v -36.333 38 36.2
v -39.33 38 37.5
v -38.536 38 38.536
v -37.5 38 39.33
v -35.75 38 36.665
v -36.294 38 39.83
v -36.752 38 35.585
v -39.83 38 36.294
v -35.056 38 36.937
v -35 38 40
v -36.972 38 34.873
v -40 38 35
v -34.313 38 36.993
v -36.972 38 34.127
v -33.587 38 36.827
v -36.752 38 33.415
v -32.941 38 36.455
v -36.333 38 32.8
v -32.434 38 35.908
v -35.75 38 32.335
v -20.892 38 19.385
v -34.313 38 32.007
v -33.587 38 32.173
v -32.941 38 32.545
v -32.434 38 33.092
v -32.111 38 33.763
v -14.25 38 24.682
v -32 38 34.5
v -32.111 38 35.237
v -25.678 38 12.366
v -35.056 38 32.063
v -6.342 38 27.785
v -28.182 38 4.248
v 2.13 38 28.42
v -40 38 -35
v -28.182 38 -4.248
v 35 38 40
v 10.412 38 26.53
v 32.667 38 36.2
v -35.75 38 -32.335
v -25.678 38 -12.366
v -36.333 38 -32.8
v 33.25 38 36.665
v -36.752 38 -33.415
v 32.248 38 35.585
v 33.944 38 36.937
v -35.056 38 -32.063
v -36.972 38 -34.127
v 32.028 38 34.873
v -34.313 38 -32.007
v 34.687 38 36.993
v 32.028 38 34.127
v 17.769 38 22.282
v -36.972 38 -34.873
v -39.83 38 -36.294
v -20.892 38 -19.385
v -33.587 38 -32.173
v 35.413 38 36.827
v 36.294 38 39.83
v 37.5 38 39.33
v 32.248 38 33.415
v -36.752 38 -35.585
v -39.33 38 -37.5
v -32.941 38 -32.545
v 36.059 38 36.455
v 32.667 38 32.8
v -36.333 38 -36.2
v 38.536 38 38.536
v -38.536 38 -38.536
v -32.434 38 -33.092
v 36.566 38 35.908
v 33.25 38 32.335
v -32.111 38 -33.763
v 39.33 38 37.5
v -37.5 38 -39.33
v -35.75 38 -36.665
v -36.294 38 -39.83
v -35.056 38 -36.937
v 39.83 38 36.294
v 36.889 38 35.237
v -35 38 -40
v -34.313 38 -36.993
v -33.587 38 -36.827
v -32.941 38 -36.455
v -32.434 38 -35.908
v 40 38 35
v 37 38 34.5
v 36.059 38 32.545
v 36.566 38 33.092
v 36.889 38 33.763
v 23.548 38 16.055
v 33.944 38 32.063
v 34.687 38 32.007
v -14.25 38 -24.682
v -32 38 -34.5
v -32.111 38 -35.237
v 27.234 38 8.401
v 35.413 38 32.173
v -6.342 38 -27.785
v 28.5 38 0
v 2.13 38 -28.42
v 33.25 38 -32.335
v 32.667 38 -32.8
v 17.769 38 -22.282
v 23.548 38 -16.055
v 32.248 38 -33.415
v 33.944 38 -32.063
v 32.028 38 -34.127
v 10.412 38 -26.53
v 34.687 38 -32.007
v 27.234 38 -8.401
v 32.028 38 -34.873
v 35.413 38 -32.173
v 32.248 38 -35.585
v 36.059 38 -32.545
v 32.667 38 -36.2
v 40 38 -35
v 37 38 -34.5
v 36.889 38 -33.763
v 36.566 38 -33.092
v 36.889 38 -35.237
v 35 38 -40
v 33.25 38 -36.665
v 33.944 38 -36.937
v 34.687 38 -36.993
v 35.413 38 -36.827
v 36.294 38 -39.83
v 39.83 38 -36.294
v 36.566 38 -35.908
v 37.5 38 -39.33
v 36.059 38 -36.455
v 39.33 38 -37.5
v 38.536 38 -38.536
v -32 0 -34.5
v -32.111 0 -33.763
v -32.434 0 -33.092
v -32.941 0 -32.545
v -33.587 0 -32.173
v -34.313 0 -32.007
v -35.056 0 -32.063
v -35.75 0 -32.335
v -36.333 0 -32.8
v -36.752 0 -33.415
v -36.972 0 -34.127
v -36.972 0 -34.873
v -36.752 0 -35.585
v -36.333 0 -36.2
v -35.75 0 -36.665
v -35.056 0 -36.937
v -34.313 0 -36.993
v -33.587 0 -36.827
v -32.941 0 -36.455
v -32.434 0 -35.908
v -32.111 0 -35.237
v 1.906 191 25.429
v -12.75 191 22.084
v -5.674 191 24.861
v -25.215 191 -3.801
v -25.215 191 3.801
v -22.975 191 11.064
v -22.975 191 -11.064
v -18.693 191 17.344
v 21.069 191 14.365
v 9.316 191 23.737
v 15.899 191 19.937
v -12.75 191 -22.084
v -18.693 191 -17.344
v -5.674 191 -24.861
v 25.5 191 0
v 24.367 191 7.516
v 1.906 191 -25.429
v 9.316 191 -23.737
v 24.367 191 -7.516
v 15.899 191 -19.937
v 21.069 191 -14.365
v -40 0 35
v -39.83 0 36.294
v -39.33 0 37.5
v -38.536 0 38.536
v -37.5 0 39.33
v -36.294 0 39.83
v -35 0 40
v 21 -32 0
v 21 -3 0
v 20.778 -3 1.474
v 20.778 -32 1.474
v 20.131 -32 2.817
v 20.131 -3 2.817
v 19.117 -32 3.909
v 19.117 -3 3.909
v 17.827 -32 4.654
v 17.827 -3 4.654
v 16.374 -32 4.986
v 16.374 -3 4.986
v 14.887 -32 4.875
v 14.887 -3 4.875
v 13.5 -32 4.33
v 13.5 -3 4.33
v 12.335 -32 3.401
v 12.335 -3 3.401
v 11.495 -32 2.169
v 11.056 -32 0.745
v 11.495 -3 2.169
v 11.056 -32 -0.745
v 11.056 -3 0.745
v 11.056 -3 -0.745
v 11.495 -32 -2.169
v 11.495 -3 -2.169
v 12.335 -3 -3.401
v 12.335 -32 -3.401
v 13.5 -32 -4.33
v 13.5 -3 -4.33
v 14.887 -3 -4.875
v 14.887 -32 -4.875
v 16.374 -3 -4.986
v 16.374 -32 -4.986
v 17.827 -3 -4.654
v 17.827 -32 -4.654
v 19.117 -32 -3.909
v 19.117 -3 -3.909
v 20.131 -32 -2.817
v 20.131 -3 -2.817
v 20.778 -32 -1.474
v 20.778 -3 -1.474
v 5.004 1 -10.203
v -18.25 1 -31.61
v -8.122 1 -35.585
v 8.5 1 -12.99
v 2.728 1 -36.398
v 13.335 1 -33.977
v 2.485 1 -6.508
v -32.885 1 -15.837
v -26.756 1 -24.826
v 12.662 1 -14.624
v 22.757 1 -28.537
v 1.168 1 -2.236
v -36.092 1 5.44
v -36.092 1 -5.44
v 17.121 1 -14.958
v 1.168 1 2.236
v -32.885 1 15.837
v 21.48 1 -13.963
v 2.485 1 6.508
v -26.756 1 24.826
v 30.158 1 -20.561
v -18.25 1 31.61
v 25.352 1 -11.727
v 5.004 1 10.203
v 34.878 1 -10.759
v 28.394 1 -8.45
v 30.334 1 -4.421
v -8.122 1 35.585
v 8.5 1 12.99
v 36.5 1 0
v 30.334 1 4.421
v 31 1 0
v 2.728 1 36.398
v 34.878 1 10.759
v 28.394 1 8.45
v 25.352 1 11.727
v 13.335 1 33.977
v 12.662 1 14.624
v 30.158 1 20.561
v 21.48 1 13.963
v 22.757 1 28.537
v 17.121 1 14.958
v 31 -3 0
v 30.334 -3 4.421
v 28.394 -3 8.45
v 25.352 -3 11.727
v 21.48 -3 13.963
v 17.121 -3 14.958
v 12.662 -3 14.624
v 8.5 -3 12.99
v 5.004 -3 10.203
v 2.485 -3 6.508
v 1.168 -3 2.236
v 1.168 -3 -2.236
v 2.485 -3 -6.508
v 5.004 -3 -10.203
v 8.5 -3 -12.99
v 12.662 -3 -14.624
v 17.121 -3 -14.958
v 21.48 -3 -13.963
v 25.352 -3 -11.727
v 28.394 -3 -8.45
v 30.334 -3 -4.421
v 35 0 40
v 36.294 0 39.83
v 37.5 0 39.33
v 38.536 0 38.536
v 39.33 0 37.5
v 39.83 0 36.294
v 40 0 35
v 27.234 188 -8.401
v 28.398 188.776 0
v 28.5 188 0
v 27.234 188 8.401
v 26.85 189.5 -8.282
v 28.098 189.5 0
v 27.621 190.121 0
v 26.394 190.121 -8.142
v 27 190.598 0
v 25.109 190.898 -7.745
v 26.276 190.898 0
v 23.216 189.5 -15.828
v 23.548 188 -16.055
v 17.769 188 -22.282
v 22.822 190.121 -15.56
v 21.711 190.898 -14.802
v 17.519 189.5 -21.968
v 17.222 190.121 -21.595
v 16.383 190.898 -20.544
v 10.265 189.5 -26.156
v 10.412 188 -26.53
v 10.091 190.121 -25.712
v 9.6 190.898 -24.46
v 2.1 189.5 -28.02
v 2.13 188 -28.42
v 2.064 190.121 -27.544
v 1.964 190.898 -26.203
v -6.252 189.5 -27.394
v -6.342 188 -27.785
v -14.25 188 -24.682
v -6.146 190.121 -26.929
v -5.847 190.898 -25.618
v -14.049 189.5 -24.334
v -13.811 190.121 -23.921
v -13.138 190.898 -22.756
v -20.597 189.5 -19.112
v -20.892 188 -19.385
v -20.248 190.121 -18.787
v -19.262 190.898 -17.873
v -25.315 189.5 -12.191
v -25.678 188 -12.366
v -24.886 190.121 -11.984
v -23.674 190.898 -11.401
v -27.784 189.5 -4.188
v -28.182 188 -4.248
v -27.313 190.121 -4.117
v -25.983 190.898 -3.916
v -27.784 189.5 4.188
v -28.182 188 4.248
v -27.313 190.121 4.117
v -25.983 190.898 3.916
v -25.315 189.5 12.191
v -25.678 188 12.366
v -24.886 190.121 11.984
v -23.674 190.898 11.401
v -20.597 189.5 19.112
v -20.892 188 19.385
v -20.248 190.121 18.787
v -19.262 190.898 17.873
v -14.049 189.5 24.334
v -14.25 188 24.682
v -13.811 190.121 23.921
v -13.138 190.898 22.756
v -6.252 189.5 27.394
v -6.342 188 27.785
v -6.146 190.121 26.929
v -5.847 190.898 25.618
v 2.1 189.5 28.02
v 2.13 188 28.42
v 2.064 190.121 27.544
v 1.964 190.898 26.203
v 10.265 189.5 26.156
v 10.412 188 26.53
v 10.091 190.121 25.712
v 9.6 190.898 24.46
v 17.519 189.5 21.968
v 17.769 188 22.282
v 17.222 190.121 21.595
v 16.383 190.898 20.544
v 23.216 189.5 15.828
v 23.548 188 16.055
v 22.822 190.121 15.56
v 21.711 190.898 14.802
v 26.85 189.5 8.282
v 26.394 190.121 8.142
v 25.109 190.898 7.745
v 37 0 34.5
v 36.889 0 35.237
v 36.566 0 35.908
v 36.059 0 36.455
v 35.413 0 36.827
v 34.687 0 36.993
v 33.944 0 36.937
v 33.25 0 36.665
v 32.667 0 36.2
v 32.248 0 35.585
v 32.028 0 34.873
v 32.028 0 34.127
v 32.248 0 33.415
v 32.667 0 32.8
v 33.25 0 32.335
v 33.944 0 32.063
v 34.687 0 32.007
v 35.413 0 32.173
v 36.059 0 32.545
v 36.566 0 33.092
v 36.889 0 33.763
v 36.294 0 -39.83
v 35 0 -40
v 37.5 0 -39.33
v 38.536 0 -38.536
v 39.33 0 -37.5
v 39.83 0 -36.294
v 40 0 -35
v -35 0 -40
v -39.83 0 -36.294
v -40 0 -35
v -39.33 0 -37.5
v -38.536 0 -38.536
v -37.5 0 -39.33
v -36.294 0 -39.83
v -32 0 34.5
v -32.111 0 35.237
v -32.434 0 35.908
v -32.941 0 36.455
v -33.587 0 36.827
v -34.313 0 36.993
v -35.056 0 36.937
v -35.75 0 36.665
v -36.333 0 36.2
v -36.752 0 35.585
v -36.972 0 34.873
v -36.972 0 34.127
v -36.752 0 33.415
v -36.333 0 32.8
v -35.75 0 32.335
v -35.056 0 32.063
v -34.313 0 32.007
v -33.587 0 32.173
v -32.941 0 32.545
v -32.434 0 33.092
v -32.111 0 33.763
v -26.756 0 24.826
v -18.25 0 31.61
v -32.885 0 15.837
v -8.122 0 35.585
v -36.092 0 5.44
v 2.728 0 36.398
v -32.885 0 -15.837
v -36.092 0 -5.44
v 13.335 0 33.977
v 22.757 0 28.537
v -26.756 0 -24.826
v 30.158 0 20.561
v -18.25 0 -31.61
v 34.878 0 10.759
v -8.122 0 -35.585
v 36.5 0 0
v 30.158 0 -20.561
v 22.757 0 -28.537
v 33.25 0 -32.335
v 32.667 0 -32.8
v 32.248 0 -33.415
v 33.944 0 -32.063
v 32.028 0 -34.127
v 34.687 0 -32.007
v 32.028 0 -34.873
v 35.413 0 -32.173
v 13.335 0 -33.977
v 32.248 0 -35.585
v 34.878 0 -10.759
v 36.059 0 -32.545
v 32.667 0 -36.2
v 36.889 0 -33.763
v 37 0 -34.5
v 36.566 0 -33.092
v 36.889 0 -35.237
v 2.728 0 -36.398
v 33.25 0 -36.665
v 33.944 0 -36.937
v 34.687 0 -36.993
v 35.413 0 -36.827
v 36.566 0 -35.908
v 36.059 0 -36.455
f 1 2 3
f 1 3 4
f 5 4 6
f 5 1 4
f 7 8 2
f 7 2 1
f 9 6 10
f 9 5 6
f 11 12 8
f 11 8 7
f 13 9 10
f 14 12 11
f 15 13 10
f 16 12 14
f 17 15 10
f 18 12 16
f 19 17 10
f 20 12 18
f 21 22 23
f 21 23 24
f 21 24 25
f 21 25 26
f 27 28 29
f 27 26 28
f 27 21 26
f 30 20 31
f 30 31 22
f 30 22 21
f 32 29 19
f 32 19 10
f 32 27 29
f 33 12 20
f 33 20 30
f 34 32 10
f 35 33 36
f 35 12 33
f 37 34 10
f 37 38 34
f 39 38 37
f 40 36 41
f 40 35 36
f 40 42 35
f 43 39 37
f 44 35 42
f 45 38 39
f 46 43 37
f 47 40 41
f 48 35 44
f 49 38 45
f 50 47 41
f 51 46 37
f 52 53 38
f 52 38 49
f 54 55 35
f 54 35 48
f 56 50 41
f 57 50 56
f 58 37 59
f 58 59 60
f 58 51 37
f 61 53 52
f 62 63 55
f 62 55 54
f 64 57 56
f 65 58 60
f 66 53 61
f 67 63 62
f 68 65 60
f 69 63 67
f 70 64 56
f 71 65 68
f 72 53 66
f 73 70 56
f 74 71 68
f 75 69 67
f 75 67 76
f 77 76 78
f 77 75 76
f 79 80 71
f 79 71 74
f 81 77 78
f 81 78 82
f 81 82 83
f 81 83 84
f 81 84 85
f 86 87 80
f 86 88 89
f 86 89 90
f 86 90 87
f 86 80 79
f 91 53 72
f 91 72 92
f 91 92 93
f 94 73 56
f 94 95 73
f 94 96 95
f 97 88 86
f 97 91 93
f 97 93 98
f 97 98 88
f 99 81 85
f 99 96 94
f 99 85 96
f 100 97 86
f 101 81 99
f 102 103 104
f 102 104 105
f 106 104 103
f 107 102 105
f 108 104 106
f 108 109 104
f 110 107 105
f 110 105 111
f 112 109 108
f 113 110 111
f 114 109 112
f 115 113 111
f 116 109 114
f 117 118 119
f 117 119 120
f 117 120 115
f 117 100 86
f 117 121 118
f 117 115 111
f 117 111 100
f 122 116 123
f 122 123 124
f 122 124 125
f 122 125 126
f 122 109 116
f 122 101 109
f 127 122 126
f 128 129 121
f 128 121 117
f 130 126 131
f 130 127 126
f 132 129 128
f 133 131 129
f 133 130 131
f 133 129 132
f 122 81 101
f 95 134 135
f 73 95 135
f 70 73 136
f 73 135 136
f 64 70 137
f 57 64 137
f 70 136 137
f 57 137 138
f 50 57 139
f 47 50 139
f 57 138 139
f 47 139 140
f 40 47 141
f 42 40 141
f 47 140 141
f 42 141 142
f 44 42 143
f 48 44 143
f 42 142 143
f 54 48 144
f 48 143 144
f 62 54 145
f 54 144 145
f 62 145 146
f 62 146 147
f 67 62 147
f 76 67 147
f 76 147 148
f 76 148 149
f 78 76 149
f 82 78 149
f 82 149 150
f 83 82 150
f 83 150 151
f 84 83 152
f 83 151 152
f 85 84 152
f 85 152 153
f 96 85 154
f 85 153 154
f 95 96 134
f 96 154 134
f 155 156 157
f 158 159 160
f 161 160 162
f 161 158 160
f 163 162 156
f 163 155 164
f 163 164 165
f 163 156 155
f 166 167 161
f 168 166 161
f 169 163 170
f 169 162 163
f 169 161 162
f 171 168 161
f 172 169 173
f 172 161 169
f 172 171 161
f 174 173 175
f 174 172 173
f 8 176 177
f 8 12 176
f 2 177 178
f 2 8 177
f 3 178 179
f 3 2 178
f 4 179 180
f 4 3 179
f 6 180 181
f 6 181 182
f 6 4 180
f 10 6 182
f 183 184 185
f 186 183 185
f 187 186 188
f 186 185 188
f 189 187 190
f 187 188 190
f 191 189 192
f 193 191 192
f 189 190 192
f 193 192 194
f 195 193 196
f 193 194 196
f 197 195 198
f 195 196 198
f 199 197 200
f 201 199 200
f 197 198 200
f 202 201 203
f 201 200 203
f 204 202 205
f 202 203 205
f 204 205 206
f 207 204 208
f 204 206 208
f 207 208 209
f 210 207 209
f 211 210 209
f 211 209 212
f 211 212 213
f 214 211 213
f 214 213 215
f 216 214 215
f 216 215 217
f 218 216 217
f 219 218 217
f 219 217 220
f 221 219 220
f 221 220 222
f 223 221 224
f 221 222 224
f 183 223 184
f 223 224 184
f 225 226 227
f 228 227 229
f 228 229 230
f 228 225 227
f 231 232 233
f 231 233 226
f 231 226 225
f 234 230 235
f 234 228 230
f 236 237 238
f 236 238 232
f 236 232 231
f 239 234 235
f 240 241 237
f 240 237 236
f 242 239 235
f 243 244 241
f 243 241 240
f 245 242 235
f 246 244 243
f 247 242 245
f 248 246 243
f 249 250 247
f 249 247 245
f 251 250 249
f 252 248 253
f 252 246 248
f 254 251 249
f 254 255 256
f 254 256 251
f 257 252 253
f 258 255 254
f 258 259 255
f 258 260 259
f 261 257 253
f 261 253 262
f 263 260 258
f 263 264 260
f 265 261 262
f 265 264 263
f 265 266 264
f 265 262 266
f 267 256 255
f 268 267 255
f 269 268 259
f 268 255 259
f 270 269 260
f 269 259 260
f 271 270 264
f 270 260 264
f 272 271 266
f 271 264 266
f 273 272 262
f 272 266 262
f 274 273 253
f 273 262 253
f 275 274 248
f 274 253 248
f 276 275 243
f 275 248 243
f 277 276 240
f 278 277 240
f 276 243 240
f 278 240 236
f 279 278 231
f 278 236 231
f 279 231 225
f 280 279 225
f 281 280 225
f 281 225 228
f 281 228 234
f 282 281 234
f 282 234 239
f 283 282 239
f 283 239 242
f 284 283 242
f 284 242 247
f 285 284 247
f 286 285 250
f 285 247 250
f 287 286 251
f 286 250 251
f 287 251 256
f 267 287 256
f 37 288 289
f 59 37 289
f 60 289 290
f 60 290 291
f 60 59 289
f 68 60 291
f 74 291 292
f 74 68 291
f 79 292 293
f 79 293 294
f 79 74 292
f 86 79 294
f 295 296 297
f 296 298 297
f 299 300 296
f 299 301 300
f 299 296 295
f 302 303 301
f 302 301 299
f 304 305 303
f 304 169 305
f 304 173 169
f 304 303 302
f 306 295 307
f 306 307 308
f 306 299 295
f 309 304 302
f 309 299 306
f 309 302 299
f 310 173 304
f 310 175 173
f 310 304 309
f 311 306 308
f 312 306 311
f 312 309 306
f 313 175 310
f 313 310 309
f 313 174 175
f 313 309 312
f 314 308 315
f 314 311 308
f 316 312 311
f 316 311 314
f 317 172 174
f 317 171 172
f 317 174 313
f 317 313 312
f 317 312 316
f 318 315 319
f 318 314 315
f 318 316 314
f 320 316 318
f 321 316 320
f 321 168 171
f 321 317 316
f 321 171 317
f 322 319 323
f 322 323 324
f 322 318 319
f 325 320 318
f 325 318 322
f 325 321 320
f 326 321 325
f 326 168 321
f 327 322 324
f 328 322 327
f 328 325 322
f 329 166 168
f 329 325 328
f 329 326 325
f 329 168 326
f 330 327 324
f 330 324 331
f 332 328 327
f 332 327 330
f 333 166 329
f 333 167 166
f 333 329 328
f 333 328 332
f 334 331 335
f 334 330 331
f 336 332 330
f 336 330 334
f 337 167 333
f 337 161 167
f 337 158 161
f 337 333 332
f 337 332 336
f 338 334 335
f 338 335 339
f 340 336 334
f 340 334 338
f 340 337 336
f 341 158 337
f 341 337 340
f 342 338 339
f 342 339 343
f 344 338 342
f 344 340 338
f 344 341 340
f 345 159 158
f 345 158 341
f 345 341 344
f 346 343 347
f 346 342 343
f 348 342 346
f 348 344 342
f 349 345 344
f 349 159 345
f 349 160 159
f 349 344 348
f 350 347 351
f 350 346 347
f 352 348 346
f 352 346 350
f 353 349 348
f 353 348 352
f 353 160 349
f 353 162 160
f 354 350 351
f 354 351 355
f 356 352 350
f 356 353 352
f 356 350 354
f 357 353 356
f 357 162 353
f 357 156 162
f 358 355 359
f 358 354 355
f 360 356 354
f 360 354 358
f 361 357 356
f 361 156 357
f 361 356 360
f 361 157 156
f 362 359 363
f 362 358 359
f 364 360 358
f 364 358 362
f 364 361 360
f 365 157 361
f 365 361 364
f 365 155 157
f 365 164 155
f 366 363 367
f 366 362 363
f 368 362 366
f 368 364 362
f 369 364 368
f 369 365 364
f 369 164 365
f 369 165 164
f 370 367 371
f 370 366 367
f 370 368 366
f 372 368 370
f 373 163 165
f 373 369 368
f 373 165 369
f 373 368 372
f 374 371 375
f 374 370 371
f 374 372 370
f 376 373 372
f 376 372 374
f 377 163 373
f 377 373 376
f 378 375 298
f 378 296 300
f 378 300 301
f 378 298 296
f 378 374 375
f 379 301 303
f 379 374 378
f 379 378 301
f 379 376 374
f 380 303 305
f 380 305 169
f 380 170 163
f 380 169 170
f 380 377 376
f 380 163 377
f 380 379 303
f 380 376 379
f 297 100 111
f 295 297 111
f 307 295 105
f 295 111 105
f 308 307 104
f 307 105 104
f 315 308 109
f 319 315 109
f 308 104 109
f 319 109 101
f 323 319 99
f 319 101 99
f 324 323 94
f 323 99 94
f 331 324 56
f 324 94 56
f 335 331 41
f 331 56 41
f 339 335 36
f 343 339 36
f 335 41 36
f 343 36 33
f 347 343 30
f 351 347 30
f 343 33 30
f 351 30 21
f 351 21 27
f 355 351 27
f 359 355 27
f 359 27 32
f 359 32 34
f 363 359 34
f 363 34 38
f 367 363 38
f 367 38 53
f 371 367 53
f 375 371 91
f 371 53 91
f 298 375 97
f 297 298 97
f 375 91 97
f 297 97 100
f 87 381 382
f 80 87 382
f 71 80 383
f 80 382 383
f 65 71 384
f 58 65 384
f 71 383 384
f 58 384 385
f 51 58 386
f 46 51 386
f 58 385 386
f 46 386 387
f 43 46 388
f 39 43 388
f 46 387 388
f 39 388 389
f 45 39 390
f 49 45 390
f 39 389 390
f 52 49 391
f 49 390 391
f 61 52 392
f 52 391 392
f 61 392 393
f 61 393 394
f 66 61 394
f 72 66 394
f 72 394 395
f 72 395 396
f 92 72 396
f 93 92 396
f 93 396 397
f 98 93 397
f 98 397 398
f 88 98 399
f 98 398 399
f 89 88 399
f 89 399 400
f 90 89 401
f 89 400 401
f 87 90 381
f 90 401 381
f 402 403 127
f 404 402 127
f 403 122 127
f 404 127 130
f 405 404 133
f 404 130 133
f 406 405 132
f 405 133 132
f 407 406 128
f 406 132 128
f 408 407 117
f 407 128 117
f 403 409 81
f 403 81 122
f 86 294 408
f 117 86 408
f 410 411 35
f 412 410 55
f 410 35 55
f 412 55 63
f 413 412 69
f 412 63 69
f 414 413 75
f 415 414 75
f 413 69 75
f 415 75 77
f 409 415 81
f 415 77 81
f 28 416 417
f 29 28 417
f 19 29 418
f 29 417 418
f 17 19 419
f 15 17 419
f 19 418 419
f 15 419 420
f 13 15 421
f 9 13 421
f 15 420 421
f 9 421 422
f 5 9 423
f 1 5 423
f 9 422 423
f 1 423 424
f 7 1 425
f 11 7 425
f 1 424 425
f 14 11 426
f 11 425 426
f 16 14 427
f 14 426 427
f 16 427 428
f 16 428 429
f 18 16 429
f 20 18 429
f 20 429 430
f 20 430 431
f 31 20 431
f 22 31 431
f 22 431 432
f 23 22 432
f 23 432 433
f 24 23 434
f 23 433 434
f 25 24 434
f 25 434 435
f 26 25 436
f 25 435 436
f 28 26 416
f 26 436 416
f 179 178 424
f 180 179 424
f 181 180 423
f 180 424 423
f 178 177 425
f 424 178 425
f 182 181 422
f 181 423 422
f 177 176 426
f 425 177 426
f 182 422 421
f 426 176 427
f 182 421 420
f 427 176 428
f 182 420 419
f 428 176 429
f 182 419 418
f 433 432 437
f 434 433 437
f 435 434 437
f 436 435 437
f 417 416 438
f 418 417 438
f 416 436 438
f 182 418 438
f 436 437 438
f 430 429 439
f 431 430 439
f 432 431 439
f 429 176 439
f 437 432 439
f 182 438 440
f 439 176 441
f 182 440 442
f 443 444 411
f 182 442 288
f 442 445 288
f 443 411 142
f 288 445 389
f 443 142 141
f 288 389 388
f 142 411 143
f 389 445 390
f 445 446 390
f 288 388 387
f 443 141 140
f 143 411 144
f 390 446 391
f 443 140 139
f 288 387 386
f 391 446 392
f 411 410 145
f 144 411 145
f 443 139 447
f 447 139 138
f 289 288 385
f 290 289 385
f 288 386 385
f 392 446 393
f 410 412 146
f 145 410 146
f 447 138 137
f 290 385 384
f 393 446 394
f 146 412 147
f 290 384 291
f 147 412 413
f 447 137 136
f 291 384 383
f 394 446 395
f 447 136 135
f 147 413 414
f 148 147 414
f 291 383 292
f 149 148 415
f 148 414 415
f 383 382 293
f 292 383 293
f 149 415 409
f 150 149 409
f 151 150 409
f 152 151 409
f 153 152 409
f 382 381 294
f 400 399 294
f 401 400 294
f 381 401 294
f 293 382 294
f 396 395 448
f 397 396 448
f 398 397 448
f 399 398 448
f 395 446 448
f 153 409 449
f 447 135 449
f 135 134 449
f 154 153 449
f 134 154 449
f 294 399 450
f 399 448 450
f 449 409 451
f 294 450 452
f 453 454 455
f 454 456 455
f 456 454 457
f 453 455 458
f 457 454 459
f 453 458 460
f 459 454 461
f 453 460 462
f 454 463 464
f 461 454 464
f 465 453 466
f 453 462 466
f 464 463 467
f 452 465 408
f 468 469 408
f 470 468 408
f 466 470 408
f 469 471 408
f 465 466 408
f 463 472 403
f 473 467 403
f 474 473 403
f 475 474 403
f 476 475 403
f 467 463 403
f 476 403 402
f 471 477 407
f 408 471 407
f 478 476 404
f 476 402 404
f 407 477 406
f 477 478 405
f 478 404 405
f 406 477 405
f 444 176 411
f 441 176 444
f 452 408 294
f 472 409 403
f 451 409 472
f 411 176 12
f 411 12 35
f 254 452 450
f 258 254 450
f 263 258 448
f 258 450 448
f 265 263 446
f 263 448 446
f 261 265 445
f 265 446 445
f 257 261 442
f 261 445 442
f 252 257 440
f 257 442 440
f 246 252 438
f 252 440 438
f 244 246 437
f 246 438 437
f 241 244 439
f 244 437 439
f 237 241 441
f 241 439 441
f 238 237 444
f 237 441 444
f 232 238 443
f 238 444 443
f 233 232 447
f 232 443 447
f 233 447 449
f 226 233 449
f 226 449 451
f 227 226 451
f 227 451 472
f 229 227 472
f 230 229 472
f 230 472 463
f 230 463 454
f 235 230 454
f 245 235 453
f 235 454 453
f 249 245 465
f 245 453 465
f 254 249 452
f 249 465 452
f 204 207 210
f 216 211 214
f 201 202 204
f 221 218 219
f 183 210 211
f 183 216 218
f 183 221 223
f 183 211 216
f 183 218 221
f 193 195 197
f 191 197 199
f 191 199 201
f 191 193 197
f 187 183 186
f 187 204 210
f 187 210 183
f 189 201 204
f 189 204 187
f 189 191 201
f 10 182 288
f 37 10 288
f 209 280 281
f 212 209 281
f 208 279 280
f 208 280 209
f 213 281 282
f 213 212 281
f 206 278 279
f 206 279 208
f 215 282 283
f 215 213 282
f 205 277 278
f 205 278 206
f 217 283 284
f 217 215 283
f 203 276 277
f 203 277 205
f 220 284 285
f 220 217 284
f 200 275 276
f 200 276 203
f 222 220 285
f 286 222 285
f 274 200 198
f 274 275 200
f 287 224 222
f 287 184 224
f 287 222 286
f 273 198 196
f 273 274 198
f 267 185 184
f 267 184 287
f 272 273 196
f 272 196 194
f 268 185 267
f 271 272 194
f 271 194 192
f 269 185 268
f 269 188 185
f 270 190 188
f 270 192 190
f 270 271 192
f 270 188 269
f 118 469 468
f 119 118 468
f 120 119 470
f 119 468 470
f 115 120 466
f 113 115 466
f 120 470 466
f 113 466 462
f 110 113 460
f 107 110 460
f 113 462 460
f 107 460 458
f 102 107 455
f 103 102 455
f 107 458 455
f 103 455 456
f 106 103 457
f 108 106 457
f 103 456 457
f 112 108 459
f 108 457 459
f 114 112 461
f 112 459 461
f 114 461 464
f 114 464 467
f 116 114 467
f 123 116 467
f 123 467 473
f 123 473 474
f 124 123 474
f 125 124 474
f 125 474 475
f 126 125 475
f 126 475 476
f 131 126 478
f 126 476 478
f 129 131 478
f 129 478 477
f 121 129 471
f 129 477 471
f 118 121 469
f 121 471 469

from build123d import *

# Parameters (mm, degrees)
SKETCH1_W           = 80
SKETCH1_H           = 80
BOSS_EXTRUDE1_DEPTH = 38
SKETCH2_R           = 28.5
BOSS_EXTRUDE2_DEPTH = 153
SKETCH3_R           = 36.5
CUT_EXTRUDE1_DEPTH  = 1
SKETCH4_R           = 15
BOSS_EXTRUDE3_DEPTH = 4
SKETCH5_R           = 5
BOSS_EXTRUDE4_DEPTH = 29
FILLET1_R           = 5
SKETCH6_R           = 2.5
CUT_EXTRUDE2_DEPTH  = 38
SKETCH7_R           = 2.5
CUT_EXTRUDE3_DEPTH  = 38
FILLET2_R           = 3


with BuildPart() as part:
    # Sketch1 → Boss-Extrude1 (new body)
    with BuildSketch(Plane(origin=(0, 0, 0), x_dir=(1, 0, 0), z_dir=(0, 1, 0))):
        Rectangle(SKETCH1_W, SKETCH1_H)
    extrude(amount=BOSS_EXTRUDE1_DEPTH)

    # Sketch2 → Boss-Extrude2 (add)
    with BuildSketch(Plane(origin=(0, 38, 0), x_dir=(1, 0, 0), z_dir=(0, 1, 0))):
        Circle(SKETCH2_R)
    extrude(amount=BOSS_EXTRUDE2_DEPTH)

    # Sketch3 → Cut-Extrude1 (cut)
    with BuildSketch(Plane.XZ):
        Circle(SKETCH3_R)
    extrude(amount=-CUT_EXTRUDE1_DEPTH, mode=Mode.SUBTRACT)

    # Sketch4 → Boss-Extrude3 (add)
    with BuildSketch(Plane.XZ.offset(-1)):
        with Locations((16, 0)):
            Circle(SKETCH4_R)
    extrude(amount=BOSS_EXTRUDE3_DEPTH)

    # Sketch5 → Boss-Extrude4 (add)
    with BuildSketch(Plane.XZ.offset(3)):
        with Locations((16, 0)):
            Circle(SKETCH5_R)
    extrude(amount=BOSS_EXTRUDE4_DEPTH)

    # Fillet1
    fillet1_edges = [part.edges().sort_by_distance(p)[0] for p in [
        (40, 19, 40),
        (-40, 19, 40),
        (-40, 19, -40),
        (40, 19, -40),
    ]]
    fillet(fillet1_edges, radius=FILLET1_R)

    # Sketch6 → Cut-Extrude2 (cut)
    with BuildSketch(Plane.XZ):
        with Locations((-34.5, 34.5)):
            Circle(SKETCH6_R)
    extrude(amount=-CUT_EXTRUDE2_DEPTH, mode=Mode.SUBTRACT)

    # Sketch7 → Cut-Extrude3 (cut)
    with BuildSketch(Plane.XZ):
        with Locations((34.5, 34.5)):
            Circle(SKETCH7_R)
        with Locations((34.5, -34.5)):
            Circle(SKETCH7_R)
        with Locations((-34.5, -34.5)):
            Circle(SKETCH7_R)
    extrude(amount=-CUT_EXTRUDE3_DEPTH, mode=Mode.SUBTRACT)

    # Fillet2
    fillet2_edges = [part.edges().sort_by_distance(p)[0] for p in [
        (-28.5, 191, 0),
    ]]
    fillet(fillet2_edges, radius=FILLET2_R)


solid = part.part
